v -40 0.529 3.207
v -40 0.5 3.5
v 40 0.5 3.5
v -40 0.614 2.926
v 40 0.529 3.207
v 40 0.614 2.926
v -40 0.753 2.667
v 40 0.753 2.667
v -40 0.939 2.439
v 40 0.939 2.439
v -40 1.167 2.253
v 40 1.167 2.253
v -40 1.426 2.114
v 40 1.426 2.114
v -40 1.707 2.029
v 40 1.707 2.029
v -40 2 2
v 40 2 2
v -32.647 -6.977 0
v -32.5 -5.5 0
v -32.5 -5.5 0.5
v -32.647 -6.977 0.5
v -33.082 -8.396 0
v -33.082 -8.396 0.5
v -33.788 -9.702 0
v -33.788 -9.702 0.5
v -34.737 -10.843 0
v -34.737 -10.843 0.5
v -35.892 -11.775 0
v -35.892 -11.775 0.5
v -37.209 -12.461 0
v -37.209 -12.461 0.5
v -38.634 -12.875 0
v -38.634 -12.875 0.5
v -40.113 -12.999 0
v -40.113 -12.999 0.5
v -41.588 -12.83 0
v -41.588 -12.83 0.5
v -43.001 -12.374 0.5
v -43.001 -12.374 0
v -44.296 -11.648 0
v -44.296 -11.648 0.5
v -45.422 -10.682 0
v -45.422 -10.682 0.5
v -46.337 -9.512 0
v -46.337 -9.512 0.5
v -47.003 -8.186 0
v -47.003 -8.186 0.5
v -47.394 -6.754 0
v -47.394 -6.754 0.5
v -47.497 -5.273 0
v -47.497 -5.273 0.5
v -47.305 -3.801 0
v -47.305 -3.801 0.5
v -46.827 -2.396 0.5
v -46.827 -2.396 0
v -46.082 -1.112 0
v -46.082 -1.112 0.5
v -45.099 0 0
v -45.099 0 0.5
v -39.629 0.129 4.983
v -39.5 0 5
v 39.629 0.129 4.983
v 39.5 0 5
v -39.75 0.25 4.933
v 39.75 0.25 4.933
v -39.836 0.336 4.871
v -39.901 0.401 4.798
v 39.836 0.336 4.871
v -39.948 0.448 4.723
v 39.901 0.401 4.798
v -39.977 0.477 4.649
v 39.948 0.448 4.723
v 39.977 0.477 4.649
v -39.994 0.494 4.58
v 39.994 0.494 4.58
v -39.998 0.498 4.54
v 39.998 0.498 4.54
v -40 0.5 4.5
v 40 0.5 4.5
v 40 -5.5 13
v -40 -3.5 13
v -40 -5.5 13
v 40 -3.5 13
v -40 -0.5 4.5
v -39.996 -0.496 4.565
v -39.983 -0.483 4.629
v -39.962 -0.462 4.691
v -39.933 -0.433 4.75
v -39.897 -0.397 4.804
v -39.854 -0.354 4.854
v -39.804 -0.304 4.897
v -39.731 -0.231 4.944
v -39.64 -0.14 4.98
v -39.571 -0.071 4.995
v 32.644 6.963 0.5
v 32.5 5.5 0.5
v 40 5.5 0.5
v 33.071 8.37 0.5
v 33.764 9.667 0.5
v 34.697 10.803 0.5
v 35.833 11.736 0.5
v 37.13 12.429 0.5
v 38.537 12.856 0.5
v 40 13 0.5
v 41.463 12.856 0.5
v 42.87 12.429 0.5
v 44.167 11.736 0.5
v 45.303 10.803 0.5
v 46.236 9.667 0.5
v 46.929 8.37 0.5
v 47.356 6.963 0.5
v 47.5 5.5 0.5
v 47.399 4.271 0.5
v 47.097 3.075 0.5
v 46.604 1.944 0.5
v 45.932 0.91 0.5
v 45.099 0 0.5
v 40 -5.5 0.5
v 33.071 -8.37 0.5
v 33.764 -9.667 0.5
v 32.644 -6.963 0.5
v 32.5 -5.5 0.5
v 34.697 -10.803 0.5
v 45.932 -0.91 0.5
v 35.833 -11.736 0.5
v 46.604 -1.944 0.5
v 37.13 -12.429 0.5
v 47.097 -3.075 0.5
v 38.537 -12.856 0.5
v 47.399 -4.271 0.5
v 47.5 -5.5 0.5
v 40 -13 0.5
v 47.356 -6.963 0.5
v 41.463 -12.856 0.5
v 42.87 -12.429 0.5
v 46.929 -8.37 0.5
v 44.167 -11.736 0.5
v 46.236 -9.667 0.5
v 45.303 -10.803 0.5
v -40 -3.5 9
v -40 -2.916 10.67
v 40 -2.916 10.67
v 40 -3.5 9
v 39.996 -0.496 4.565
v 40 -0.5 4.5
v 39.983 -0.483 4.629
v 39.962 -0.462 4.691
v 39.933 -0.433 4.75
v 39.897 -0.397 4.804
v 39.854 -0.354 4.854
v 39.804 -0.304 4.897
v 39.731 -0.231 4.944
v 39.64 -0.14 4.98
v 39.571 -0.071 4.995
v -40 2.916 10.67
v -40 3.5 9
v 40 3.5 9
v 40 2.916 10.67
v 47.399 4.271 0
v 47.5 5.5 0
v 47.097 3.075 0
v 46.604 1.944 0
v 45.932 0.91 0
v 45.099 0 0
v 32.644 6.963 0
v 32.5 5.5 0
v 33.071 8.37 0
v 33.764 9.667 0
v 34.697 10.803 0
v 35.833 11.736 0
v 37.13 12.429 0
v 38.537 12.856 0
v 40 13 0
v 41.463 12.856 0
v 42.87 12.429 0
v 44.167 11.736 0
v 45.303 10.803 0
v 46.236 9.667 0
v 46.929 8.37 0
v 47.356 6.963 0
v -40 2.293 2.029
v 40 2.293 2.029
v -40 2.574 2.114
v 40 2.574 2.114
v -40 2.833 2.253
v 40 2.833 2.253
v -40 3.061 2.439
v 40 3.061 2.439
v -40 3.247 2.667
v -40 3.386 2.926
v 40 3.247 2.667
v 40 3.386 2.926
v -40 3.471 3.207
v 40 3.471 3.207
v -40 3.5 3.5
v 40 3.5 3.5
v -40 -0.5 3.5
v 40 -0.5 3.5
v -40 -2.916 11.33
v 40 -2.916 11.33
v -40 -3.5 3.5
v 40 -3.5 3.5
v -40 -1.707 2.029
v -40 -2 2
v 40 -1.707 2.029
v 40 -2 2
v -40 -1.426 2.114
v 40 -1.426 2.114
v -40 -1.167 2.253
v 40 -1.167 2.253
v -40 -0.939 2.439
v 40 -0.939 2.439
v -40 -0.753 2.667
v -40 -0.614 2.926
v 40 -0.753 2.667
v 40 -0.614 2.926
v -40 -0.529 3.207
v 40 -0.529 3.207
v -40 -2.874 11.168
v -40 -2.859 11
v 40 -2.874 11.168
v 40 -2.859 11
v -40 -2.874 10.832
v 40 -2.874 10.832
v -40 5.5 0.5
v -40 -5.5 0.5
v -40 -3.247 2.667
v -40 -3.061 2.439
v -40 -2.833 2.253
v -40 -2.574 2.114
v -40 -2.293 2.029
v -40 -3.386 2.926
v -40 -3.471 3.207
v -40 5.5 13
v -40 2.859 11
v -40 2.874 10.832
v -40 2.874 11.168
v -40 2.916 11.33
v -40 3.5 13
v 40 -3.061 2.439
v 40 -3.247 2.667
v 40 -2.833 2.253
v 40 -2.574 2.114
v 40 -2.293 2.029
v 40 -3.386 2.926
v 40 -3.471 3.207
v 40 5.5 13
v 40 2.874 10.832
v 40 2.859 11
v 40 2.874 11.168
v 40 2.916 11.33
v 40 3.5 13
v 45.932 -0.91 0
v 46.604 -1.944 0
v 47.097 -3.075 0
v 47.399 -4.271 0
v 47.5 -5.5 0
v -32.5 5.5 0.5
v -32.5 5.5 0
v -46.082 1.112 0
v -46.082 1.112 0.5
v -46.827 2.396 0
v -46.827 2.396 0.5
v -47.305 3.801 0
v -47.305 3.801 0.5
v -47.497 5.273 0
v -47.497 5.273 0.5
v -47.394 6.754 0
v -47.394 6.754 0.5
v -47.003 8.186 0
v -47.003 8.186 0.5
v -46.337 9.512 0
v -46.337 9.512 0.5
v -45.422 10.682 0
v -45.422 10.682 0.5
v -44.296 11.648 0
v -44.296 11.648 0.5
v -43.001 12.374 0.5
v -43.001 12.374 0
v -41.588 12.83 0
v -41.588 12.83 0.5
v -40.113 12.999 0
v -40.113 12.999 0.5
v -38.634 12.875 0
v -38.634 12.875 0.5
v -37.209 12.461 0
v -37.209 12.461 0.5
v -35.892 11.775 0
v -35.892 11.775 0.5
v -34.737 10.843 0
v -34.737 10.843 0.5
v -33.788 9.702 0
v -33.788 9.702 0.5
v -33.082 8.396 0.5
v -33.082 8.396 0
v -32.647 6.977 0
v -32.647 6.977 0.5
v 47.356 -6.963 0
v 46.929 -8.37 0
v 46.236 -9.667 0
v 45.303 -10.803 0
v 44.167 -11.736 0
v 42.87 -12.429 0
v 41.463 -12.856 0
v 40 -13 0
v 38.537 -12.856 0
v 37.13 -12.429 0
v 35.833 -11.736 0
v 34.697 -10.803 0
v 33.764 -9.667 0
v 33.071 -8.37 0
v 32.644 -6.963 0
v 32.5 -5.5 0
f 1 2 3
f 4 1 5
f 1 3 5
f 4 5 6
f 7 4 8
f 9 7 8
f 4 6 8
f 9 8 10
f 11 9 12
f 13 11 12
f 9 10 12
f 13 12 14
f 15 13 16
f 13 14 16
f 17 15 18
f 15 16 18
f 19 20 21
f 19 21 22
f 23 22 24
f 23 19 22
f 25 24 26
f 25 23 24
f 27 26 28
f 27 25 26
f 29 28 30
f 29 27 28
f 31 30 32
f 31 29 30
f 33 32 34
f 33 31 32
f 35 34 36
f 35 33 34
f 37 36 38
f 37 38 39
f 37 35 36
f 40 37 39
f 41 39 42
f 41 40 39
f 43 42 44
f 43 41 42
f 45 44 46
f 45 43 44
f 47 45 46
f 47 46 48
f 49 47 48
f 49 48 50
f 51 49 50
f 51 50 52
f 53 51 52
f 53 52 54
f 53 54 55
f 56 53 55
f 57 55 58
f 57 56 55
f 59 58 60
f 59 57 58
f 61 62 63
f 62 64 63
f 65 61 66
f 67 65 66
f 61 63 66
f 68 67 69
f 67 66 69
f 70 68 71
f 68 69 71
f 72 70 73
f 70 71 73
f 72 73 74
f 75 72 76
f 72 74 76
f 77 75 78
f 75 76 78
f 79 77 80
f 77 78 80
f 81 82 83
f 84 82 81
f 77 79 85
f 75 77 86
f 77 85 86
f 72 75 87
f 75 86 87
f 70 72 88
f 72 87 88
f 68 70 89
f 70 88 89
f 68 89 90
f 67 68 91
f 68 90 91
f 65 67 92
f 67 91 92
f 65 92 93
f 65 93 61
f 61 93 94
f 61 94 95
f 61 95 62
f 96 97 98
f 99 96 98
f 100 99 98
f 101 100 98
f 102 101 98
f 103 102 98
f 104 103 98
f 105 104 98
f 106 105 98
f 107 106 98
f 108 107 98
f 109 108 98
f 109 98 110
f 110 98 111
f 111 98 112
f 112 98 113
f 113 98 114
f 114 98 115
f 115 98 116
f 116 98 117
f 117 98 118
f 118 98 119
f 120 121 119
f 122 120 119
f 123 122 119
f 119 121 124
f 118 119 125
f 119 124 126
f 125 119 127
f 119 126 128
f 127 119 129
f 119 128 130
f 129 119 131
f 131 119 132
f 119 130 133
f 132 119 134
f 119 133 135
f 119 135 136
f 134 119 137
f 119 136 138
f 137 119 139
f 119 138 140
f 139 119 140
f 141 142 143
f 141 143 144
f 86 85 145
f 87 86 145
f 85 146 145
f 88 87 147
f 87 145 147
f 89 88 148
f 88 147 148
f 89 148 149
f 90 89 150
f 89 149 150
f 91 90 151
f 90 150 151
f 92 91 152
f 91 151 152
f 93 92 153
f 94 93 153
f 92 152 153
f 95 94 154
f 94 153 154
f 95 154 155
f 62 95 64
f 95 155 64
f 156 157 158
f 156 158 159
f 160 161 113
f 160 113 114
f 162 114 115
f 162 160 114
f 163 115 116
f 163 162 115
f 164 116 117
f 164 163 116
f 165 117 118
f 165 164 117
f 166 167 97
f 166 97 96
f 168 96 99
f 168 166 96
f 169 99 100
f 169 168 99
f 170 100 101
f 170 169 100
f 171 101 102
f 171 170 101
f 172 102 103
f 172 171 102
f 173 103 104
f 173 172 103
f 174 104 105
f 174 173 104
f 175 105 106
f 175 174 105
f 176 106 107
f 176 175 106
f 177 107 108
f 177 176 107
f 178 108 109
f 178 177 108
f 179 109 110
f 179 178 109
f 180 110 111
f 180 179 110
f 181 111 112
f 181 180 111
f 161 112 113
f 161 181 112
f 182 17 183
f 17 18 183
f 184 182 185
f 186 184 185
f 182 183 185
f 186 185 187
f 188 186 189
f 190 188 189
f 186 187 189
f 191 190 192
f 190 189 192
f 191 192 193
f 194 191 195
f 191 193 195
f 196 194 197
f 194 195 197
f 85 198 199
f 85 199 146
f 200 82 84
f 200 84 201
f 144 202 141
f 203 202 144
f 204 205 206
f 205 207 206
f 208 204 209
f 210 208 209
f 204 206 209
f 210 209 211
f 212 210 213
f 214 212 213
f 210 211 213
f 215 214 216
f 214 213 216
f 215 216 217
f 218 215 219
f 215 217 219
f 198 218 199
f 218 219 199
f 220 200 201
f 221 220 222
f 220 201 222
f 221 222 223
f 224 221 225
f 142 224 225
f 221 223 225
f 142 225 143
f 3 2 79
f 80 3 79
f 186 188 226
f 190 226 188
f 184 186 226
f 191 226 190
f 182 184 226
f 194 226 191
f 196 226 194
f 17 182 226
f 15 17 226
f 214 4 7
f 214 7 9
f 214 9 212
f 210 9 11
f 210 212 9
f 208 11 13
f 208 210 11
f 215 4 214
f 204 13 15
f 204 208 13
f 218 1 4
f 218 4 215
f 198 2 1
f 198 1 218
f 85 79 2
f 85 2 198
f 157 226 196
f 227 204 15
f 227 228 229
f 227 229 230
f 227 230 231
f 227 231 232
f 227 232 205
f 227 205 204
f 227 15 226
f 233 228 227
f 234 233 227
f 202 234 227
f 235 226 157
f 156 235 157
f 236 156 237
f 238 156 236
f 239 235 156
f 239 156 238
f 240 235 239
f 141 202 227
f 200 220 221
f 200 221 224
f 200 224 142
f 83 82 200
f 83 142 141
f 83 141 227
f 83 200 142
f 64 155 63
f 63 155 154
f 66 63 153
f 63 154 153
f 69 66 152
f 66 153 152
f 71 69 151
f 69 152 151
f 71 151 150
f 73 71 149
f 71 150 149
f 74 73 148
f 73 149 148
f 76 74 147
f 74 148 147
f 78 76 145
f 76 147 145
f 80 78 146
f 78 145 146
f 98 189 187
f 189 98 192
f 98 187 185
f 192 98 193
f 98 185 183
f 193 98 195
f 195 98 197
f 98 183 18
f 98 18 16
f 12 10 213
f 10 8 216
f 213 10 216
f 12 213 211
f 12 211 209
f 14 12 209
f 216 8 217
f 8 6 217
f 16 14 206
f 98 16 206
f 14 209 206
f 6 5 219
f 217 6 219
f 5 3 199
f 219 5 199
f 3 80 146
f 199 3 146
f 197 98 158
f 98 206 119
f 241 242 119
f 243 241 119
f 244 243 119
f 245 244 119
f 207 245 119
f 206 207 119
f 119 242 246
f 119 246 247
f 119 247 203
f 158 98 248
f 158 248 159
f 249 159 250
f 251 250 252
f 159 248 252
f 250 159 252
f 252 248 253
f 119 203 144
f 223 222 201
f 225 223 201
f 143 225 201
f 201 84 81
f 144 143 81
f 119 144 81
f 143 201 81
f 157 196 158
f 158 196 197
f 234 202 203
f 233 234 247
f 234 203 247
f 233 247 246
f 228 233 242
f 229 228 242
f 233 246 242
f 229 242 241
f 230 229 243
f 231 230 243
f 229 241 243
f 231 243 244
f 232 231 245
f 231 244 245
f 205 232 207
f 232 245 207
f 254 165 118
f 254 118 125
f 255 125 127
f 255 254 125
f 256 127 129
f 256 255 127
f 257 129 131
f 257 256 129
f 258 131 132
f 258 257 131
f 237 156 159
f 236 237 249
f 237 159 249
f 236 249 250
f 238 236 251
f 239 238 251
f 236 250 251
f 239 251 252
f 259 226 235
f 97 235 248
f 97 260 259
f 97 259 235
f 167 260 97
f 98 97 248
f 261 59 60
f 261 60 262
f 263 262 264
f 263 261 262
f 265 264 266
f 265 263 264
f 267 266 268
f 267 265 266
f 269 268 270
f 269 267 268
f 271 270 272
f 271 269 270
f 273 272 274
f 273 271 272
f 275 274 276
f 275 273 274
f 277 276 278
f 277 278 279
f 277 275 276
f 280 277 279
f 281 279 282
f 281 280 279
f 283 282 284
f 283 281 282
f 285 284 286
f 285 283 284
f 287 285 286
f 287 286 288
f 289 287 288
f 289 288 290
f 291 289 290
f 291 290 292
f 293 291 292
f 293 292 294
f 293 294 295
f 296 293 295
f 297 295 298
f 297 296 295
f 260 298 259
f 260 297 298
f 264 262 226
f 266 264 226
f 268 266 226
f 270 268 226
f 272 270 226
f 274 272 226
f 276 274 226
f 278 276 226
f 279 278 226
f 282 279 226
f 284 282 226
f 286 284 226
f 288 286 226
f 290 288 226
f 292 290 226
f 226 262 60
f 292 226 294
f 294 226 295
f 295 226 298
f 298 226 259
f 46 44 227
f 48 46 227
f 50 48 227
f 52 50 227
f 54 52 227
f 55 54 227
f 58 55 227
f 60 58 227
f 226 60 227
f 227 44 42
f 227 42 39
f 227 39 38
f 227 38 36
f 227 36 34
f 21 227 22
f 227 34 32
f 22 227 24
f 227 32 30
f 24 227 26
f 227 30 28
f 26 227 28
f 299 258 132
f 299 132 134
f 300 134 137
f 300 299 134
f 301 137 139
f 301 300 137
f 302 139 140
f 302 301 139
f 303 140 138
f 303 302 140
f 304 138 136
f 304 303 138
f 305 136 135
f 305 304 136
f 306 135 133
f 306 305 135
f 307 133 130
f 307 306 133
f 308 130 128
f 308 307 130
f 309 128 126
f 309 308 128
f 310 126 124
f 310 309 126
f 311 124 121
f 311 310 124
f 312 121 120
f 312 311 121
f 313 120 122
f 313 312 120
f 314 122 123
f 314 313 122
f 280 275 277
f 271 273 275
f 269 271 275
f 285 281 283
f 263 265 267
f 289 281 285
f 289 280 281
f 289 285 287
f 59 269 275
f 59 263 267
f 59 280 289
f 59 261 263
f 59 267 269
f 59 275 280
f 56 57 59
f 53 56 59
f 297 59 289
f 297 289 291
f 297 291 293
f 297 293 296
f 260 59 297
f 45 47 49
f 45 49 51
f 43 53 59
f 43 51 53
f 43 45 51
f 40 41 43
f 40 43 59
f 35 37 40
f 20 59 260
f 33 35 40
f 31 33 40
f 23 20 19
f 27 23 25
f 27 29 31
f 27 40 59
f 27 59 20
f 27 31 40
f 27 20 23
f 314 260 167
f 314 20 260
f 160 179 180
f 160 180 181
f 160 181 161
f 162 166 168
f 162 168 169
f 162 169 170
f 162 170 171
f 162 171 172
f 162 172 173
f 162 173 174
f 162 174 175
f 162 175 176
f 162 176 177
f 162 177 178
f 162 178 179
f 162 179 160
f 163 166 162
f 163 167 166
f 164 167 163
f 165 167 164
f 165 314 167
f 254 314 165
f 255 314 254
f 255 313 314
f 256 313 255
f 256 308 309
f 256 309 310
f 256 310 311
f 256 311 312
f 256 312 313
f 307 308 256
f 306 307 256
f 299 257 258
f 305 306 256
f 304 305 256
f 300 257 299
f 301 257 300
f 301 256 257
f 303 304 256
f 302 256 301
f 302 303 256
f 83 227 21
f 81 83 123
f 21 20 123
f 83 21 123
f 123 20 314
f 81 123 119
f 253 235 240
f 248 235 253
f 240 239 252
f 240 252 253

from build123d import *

# Parameters (mm, degrees)
F0_W      = 80
F0_H      = 7
F1_DEPTH  = 2
F0_H_2    = 2
F2_DEPTH  = 13
F3_W      = 1
F3_H      = 3
F4_DEPTH  = 80
F5_R      = 1
F6_R      = 1
F7_R      = 1.49999
F8_R      = 0.49999
F10_DEPTH = 0.5


# Not quite as in the source:
# - a fillet or chamfer is up to 0.001 mm smaller than in the source, because OpenCascade refuses the exact size
# - a feature names something its author has since deleted; it is built from what else it names


with BuildPart() as f1:
    # F0 (on Top) → F1 (new body)
    with BuildSketch(Plane.XY):
        Rectangle(F0_W, F0_H)
    extrude(amount=F1_DEPTH)

    # F0 (on Top) → F2 (join)
    with BuildSketch(Plane.XY):
        with Locations((0, 4.5)):
            Rectangle(F0_W, F0_H_2)
        with Locations((0, -4.5)):
            Rectangle(F0_W, F0_H_2)
    extrude(amount=F2_DEPTH)

    # F3 (on face) → F4 (join)
    with BuildSketch(Plane(origin=(-40, 0, 0), x_dir=(0, -1, 0), z_dir=(-1, 0, 0))):
        Polygon((-3.5, 13), (-3.5, 9), (-2.8, 11), align=None)
        Polygon((2.8, 11), (3.5, 9), (3.5, 13), align=None)
        with Locations((0, 3.5)):
            Rectangle(F3_W, F3_H)
    extrude(amount=-F4_DEPTH)

    # F5
    f5_edges = [f1.edges().sort_by_distance(p)[0] for p in [
        (0, 2.8, 11),
    ]]
    fillet(f5_edges, radius=F5_R)

    # F6
    f6_edges = [f1.edges().sort_by_distance(p)[0] for p in [
        (0, -2.8, 11),
    ]]
    fillet(f6_edges, radius=F6_R)

    # F7 (radius 1.5 in the source; OpenCascade refuses exactly that, so slightly less here)
    f7_edges = [f1.edges().sort_by_distance(p)[0] for p in [
        (0, -3.5, 2),
        (0, 3.5, 2),
        (0, -0.5, 2),
        (0, 0.5, 2),
    ]]
    fillet(f7_edges, radius=F7_R)

    # F8 (radius 0.5 in the source; OpenCascade refuses exactly that, so slightly less here)
    f8_edges = [f1.edges().sort_by_distance(p)[0] for p in [
        (0, -0.5, 5),
        (0, 0.5, 5),
        (-40, 0, 5),
        (40, 0, 5),
    ]]
    fillet(f8_edges, radius=F8_R)

    # F9 (on face) → F10 (join)
    with BuildSketch(Plane(origin=(0, 0, 0), x_dir=(1, 0, 0), z_dir=(0, 0, -1))):
        with BuildLine():
            ThreePointArc((-40, 2), (-42.7386127875, 1.4821200219), (-45.0990195136, 0))
            ThreePointArc((-45.0990195136, 0), (-42.7386127875, -1.4821200219), (-40, -2))
            Line((-40, -2), (-40, 2))
        make_face()
        with BuildLine():
            Line((-40, 5.5), (-32.5, 5.5))
            ThreePointArc((-32.5, 5.5), (-43.0006127414, 12.3735960876), (-45.0990195136, 0))
            ThreePointArc((-45.0990195136, 0), (-42.7386127875, 1.4821200219), (-40, 2))
            Line((-40, 2), (-40, 5.5))
        make_face()
        with BuildLine():
            ThreePointArc((-40, -2), (-42.7386127875, -1.4821200219), (-45.0990195136, 0))
            ThreePointArc((-45.0990195136, 0), (-43.0006127414, -12.3735960876), (-32.5, -5.5))
            Line((-32.5, -5.5), (-40, -5.5))
            Line((-40, -5.5), (-40, -2))
        make_face()
        with BuildLine():
            Line((40, -5.5), (32.5, -5.5))
            ThreePointArc((32.5, -5.5), (40, -13), (47.5, -5.5))
            ThreePointArc((47.5, -5.5), (46.8735960876, -2.4993872586), (45.0990195136, 0))
            ThreePointArc((45.0990195136, 0), (42.7386127875, -1.4821200219), (40, -2))
            Line((40, -2), (40, -5.5))
        make_face()
        with BuildLine():
            ThreePointArc((40, -2), (42.7386127875, -1.4821200219), (45.0990195136, 0))
            ThreePointArc((45.0990195136, 0), (42.7386127875, 1.4821200219), (40, 2))
            Line((40, 2), (40, -2))
        make_face()
        with BuildLine():
            ThreePointArc((47.5, 5.5), (40, 13), (32.5, 5.5))
            Line((32.5, 5.5), (40, 5.5))
            Line((40, 5.5), (40, 2))
            ThreePointArc((40, 2), (42.7386127875, 1.4821200219), (45.0990195136, 0))
            ThreePointArc((45.0990195136, 0), (46.8735960876, 2.4993872586), (47.5, 5.5))
        make_face()
    extrude(amount=-F10_DEPTH)


solid = f1.part
